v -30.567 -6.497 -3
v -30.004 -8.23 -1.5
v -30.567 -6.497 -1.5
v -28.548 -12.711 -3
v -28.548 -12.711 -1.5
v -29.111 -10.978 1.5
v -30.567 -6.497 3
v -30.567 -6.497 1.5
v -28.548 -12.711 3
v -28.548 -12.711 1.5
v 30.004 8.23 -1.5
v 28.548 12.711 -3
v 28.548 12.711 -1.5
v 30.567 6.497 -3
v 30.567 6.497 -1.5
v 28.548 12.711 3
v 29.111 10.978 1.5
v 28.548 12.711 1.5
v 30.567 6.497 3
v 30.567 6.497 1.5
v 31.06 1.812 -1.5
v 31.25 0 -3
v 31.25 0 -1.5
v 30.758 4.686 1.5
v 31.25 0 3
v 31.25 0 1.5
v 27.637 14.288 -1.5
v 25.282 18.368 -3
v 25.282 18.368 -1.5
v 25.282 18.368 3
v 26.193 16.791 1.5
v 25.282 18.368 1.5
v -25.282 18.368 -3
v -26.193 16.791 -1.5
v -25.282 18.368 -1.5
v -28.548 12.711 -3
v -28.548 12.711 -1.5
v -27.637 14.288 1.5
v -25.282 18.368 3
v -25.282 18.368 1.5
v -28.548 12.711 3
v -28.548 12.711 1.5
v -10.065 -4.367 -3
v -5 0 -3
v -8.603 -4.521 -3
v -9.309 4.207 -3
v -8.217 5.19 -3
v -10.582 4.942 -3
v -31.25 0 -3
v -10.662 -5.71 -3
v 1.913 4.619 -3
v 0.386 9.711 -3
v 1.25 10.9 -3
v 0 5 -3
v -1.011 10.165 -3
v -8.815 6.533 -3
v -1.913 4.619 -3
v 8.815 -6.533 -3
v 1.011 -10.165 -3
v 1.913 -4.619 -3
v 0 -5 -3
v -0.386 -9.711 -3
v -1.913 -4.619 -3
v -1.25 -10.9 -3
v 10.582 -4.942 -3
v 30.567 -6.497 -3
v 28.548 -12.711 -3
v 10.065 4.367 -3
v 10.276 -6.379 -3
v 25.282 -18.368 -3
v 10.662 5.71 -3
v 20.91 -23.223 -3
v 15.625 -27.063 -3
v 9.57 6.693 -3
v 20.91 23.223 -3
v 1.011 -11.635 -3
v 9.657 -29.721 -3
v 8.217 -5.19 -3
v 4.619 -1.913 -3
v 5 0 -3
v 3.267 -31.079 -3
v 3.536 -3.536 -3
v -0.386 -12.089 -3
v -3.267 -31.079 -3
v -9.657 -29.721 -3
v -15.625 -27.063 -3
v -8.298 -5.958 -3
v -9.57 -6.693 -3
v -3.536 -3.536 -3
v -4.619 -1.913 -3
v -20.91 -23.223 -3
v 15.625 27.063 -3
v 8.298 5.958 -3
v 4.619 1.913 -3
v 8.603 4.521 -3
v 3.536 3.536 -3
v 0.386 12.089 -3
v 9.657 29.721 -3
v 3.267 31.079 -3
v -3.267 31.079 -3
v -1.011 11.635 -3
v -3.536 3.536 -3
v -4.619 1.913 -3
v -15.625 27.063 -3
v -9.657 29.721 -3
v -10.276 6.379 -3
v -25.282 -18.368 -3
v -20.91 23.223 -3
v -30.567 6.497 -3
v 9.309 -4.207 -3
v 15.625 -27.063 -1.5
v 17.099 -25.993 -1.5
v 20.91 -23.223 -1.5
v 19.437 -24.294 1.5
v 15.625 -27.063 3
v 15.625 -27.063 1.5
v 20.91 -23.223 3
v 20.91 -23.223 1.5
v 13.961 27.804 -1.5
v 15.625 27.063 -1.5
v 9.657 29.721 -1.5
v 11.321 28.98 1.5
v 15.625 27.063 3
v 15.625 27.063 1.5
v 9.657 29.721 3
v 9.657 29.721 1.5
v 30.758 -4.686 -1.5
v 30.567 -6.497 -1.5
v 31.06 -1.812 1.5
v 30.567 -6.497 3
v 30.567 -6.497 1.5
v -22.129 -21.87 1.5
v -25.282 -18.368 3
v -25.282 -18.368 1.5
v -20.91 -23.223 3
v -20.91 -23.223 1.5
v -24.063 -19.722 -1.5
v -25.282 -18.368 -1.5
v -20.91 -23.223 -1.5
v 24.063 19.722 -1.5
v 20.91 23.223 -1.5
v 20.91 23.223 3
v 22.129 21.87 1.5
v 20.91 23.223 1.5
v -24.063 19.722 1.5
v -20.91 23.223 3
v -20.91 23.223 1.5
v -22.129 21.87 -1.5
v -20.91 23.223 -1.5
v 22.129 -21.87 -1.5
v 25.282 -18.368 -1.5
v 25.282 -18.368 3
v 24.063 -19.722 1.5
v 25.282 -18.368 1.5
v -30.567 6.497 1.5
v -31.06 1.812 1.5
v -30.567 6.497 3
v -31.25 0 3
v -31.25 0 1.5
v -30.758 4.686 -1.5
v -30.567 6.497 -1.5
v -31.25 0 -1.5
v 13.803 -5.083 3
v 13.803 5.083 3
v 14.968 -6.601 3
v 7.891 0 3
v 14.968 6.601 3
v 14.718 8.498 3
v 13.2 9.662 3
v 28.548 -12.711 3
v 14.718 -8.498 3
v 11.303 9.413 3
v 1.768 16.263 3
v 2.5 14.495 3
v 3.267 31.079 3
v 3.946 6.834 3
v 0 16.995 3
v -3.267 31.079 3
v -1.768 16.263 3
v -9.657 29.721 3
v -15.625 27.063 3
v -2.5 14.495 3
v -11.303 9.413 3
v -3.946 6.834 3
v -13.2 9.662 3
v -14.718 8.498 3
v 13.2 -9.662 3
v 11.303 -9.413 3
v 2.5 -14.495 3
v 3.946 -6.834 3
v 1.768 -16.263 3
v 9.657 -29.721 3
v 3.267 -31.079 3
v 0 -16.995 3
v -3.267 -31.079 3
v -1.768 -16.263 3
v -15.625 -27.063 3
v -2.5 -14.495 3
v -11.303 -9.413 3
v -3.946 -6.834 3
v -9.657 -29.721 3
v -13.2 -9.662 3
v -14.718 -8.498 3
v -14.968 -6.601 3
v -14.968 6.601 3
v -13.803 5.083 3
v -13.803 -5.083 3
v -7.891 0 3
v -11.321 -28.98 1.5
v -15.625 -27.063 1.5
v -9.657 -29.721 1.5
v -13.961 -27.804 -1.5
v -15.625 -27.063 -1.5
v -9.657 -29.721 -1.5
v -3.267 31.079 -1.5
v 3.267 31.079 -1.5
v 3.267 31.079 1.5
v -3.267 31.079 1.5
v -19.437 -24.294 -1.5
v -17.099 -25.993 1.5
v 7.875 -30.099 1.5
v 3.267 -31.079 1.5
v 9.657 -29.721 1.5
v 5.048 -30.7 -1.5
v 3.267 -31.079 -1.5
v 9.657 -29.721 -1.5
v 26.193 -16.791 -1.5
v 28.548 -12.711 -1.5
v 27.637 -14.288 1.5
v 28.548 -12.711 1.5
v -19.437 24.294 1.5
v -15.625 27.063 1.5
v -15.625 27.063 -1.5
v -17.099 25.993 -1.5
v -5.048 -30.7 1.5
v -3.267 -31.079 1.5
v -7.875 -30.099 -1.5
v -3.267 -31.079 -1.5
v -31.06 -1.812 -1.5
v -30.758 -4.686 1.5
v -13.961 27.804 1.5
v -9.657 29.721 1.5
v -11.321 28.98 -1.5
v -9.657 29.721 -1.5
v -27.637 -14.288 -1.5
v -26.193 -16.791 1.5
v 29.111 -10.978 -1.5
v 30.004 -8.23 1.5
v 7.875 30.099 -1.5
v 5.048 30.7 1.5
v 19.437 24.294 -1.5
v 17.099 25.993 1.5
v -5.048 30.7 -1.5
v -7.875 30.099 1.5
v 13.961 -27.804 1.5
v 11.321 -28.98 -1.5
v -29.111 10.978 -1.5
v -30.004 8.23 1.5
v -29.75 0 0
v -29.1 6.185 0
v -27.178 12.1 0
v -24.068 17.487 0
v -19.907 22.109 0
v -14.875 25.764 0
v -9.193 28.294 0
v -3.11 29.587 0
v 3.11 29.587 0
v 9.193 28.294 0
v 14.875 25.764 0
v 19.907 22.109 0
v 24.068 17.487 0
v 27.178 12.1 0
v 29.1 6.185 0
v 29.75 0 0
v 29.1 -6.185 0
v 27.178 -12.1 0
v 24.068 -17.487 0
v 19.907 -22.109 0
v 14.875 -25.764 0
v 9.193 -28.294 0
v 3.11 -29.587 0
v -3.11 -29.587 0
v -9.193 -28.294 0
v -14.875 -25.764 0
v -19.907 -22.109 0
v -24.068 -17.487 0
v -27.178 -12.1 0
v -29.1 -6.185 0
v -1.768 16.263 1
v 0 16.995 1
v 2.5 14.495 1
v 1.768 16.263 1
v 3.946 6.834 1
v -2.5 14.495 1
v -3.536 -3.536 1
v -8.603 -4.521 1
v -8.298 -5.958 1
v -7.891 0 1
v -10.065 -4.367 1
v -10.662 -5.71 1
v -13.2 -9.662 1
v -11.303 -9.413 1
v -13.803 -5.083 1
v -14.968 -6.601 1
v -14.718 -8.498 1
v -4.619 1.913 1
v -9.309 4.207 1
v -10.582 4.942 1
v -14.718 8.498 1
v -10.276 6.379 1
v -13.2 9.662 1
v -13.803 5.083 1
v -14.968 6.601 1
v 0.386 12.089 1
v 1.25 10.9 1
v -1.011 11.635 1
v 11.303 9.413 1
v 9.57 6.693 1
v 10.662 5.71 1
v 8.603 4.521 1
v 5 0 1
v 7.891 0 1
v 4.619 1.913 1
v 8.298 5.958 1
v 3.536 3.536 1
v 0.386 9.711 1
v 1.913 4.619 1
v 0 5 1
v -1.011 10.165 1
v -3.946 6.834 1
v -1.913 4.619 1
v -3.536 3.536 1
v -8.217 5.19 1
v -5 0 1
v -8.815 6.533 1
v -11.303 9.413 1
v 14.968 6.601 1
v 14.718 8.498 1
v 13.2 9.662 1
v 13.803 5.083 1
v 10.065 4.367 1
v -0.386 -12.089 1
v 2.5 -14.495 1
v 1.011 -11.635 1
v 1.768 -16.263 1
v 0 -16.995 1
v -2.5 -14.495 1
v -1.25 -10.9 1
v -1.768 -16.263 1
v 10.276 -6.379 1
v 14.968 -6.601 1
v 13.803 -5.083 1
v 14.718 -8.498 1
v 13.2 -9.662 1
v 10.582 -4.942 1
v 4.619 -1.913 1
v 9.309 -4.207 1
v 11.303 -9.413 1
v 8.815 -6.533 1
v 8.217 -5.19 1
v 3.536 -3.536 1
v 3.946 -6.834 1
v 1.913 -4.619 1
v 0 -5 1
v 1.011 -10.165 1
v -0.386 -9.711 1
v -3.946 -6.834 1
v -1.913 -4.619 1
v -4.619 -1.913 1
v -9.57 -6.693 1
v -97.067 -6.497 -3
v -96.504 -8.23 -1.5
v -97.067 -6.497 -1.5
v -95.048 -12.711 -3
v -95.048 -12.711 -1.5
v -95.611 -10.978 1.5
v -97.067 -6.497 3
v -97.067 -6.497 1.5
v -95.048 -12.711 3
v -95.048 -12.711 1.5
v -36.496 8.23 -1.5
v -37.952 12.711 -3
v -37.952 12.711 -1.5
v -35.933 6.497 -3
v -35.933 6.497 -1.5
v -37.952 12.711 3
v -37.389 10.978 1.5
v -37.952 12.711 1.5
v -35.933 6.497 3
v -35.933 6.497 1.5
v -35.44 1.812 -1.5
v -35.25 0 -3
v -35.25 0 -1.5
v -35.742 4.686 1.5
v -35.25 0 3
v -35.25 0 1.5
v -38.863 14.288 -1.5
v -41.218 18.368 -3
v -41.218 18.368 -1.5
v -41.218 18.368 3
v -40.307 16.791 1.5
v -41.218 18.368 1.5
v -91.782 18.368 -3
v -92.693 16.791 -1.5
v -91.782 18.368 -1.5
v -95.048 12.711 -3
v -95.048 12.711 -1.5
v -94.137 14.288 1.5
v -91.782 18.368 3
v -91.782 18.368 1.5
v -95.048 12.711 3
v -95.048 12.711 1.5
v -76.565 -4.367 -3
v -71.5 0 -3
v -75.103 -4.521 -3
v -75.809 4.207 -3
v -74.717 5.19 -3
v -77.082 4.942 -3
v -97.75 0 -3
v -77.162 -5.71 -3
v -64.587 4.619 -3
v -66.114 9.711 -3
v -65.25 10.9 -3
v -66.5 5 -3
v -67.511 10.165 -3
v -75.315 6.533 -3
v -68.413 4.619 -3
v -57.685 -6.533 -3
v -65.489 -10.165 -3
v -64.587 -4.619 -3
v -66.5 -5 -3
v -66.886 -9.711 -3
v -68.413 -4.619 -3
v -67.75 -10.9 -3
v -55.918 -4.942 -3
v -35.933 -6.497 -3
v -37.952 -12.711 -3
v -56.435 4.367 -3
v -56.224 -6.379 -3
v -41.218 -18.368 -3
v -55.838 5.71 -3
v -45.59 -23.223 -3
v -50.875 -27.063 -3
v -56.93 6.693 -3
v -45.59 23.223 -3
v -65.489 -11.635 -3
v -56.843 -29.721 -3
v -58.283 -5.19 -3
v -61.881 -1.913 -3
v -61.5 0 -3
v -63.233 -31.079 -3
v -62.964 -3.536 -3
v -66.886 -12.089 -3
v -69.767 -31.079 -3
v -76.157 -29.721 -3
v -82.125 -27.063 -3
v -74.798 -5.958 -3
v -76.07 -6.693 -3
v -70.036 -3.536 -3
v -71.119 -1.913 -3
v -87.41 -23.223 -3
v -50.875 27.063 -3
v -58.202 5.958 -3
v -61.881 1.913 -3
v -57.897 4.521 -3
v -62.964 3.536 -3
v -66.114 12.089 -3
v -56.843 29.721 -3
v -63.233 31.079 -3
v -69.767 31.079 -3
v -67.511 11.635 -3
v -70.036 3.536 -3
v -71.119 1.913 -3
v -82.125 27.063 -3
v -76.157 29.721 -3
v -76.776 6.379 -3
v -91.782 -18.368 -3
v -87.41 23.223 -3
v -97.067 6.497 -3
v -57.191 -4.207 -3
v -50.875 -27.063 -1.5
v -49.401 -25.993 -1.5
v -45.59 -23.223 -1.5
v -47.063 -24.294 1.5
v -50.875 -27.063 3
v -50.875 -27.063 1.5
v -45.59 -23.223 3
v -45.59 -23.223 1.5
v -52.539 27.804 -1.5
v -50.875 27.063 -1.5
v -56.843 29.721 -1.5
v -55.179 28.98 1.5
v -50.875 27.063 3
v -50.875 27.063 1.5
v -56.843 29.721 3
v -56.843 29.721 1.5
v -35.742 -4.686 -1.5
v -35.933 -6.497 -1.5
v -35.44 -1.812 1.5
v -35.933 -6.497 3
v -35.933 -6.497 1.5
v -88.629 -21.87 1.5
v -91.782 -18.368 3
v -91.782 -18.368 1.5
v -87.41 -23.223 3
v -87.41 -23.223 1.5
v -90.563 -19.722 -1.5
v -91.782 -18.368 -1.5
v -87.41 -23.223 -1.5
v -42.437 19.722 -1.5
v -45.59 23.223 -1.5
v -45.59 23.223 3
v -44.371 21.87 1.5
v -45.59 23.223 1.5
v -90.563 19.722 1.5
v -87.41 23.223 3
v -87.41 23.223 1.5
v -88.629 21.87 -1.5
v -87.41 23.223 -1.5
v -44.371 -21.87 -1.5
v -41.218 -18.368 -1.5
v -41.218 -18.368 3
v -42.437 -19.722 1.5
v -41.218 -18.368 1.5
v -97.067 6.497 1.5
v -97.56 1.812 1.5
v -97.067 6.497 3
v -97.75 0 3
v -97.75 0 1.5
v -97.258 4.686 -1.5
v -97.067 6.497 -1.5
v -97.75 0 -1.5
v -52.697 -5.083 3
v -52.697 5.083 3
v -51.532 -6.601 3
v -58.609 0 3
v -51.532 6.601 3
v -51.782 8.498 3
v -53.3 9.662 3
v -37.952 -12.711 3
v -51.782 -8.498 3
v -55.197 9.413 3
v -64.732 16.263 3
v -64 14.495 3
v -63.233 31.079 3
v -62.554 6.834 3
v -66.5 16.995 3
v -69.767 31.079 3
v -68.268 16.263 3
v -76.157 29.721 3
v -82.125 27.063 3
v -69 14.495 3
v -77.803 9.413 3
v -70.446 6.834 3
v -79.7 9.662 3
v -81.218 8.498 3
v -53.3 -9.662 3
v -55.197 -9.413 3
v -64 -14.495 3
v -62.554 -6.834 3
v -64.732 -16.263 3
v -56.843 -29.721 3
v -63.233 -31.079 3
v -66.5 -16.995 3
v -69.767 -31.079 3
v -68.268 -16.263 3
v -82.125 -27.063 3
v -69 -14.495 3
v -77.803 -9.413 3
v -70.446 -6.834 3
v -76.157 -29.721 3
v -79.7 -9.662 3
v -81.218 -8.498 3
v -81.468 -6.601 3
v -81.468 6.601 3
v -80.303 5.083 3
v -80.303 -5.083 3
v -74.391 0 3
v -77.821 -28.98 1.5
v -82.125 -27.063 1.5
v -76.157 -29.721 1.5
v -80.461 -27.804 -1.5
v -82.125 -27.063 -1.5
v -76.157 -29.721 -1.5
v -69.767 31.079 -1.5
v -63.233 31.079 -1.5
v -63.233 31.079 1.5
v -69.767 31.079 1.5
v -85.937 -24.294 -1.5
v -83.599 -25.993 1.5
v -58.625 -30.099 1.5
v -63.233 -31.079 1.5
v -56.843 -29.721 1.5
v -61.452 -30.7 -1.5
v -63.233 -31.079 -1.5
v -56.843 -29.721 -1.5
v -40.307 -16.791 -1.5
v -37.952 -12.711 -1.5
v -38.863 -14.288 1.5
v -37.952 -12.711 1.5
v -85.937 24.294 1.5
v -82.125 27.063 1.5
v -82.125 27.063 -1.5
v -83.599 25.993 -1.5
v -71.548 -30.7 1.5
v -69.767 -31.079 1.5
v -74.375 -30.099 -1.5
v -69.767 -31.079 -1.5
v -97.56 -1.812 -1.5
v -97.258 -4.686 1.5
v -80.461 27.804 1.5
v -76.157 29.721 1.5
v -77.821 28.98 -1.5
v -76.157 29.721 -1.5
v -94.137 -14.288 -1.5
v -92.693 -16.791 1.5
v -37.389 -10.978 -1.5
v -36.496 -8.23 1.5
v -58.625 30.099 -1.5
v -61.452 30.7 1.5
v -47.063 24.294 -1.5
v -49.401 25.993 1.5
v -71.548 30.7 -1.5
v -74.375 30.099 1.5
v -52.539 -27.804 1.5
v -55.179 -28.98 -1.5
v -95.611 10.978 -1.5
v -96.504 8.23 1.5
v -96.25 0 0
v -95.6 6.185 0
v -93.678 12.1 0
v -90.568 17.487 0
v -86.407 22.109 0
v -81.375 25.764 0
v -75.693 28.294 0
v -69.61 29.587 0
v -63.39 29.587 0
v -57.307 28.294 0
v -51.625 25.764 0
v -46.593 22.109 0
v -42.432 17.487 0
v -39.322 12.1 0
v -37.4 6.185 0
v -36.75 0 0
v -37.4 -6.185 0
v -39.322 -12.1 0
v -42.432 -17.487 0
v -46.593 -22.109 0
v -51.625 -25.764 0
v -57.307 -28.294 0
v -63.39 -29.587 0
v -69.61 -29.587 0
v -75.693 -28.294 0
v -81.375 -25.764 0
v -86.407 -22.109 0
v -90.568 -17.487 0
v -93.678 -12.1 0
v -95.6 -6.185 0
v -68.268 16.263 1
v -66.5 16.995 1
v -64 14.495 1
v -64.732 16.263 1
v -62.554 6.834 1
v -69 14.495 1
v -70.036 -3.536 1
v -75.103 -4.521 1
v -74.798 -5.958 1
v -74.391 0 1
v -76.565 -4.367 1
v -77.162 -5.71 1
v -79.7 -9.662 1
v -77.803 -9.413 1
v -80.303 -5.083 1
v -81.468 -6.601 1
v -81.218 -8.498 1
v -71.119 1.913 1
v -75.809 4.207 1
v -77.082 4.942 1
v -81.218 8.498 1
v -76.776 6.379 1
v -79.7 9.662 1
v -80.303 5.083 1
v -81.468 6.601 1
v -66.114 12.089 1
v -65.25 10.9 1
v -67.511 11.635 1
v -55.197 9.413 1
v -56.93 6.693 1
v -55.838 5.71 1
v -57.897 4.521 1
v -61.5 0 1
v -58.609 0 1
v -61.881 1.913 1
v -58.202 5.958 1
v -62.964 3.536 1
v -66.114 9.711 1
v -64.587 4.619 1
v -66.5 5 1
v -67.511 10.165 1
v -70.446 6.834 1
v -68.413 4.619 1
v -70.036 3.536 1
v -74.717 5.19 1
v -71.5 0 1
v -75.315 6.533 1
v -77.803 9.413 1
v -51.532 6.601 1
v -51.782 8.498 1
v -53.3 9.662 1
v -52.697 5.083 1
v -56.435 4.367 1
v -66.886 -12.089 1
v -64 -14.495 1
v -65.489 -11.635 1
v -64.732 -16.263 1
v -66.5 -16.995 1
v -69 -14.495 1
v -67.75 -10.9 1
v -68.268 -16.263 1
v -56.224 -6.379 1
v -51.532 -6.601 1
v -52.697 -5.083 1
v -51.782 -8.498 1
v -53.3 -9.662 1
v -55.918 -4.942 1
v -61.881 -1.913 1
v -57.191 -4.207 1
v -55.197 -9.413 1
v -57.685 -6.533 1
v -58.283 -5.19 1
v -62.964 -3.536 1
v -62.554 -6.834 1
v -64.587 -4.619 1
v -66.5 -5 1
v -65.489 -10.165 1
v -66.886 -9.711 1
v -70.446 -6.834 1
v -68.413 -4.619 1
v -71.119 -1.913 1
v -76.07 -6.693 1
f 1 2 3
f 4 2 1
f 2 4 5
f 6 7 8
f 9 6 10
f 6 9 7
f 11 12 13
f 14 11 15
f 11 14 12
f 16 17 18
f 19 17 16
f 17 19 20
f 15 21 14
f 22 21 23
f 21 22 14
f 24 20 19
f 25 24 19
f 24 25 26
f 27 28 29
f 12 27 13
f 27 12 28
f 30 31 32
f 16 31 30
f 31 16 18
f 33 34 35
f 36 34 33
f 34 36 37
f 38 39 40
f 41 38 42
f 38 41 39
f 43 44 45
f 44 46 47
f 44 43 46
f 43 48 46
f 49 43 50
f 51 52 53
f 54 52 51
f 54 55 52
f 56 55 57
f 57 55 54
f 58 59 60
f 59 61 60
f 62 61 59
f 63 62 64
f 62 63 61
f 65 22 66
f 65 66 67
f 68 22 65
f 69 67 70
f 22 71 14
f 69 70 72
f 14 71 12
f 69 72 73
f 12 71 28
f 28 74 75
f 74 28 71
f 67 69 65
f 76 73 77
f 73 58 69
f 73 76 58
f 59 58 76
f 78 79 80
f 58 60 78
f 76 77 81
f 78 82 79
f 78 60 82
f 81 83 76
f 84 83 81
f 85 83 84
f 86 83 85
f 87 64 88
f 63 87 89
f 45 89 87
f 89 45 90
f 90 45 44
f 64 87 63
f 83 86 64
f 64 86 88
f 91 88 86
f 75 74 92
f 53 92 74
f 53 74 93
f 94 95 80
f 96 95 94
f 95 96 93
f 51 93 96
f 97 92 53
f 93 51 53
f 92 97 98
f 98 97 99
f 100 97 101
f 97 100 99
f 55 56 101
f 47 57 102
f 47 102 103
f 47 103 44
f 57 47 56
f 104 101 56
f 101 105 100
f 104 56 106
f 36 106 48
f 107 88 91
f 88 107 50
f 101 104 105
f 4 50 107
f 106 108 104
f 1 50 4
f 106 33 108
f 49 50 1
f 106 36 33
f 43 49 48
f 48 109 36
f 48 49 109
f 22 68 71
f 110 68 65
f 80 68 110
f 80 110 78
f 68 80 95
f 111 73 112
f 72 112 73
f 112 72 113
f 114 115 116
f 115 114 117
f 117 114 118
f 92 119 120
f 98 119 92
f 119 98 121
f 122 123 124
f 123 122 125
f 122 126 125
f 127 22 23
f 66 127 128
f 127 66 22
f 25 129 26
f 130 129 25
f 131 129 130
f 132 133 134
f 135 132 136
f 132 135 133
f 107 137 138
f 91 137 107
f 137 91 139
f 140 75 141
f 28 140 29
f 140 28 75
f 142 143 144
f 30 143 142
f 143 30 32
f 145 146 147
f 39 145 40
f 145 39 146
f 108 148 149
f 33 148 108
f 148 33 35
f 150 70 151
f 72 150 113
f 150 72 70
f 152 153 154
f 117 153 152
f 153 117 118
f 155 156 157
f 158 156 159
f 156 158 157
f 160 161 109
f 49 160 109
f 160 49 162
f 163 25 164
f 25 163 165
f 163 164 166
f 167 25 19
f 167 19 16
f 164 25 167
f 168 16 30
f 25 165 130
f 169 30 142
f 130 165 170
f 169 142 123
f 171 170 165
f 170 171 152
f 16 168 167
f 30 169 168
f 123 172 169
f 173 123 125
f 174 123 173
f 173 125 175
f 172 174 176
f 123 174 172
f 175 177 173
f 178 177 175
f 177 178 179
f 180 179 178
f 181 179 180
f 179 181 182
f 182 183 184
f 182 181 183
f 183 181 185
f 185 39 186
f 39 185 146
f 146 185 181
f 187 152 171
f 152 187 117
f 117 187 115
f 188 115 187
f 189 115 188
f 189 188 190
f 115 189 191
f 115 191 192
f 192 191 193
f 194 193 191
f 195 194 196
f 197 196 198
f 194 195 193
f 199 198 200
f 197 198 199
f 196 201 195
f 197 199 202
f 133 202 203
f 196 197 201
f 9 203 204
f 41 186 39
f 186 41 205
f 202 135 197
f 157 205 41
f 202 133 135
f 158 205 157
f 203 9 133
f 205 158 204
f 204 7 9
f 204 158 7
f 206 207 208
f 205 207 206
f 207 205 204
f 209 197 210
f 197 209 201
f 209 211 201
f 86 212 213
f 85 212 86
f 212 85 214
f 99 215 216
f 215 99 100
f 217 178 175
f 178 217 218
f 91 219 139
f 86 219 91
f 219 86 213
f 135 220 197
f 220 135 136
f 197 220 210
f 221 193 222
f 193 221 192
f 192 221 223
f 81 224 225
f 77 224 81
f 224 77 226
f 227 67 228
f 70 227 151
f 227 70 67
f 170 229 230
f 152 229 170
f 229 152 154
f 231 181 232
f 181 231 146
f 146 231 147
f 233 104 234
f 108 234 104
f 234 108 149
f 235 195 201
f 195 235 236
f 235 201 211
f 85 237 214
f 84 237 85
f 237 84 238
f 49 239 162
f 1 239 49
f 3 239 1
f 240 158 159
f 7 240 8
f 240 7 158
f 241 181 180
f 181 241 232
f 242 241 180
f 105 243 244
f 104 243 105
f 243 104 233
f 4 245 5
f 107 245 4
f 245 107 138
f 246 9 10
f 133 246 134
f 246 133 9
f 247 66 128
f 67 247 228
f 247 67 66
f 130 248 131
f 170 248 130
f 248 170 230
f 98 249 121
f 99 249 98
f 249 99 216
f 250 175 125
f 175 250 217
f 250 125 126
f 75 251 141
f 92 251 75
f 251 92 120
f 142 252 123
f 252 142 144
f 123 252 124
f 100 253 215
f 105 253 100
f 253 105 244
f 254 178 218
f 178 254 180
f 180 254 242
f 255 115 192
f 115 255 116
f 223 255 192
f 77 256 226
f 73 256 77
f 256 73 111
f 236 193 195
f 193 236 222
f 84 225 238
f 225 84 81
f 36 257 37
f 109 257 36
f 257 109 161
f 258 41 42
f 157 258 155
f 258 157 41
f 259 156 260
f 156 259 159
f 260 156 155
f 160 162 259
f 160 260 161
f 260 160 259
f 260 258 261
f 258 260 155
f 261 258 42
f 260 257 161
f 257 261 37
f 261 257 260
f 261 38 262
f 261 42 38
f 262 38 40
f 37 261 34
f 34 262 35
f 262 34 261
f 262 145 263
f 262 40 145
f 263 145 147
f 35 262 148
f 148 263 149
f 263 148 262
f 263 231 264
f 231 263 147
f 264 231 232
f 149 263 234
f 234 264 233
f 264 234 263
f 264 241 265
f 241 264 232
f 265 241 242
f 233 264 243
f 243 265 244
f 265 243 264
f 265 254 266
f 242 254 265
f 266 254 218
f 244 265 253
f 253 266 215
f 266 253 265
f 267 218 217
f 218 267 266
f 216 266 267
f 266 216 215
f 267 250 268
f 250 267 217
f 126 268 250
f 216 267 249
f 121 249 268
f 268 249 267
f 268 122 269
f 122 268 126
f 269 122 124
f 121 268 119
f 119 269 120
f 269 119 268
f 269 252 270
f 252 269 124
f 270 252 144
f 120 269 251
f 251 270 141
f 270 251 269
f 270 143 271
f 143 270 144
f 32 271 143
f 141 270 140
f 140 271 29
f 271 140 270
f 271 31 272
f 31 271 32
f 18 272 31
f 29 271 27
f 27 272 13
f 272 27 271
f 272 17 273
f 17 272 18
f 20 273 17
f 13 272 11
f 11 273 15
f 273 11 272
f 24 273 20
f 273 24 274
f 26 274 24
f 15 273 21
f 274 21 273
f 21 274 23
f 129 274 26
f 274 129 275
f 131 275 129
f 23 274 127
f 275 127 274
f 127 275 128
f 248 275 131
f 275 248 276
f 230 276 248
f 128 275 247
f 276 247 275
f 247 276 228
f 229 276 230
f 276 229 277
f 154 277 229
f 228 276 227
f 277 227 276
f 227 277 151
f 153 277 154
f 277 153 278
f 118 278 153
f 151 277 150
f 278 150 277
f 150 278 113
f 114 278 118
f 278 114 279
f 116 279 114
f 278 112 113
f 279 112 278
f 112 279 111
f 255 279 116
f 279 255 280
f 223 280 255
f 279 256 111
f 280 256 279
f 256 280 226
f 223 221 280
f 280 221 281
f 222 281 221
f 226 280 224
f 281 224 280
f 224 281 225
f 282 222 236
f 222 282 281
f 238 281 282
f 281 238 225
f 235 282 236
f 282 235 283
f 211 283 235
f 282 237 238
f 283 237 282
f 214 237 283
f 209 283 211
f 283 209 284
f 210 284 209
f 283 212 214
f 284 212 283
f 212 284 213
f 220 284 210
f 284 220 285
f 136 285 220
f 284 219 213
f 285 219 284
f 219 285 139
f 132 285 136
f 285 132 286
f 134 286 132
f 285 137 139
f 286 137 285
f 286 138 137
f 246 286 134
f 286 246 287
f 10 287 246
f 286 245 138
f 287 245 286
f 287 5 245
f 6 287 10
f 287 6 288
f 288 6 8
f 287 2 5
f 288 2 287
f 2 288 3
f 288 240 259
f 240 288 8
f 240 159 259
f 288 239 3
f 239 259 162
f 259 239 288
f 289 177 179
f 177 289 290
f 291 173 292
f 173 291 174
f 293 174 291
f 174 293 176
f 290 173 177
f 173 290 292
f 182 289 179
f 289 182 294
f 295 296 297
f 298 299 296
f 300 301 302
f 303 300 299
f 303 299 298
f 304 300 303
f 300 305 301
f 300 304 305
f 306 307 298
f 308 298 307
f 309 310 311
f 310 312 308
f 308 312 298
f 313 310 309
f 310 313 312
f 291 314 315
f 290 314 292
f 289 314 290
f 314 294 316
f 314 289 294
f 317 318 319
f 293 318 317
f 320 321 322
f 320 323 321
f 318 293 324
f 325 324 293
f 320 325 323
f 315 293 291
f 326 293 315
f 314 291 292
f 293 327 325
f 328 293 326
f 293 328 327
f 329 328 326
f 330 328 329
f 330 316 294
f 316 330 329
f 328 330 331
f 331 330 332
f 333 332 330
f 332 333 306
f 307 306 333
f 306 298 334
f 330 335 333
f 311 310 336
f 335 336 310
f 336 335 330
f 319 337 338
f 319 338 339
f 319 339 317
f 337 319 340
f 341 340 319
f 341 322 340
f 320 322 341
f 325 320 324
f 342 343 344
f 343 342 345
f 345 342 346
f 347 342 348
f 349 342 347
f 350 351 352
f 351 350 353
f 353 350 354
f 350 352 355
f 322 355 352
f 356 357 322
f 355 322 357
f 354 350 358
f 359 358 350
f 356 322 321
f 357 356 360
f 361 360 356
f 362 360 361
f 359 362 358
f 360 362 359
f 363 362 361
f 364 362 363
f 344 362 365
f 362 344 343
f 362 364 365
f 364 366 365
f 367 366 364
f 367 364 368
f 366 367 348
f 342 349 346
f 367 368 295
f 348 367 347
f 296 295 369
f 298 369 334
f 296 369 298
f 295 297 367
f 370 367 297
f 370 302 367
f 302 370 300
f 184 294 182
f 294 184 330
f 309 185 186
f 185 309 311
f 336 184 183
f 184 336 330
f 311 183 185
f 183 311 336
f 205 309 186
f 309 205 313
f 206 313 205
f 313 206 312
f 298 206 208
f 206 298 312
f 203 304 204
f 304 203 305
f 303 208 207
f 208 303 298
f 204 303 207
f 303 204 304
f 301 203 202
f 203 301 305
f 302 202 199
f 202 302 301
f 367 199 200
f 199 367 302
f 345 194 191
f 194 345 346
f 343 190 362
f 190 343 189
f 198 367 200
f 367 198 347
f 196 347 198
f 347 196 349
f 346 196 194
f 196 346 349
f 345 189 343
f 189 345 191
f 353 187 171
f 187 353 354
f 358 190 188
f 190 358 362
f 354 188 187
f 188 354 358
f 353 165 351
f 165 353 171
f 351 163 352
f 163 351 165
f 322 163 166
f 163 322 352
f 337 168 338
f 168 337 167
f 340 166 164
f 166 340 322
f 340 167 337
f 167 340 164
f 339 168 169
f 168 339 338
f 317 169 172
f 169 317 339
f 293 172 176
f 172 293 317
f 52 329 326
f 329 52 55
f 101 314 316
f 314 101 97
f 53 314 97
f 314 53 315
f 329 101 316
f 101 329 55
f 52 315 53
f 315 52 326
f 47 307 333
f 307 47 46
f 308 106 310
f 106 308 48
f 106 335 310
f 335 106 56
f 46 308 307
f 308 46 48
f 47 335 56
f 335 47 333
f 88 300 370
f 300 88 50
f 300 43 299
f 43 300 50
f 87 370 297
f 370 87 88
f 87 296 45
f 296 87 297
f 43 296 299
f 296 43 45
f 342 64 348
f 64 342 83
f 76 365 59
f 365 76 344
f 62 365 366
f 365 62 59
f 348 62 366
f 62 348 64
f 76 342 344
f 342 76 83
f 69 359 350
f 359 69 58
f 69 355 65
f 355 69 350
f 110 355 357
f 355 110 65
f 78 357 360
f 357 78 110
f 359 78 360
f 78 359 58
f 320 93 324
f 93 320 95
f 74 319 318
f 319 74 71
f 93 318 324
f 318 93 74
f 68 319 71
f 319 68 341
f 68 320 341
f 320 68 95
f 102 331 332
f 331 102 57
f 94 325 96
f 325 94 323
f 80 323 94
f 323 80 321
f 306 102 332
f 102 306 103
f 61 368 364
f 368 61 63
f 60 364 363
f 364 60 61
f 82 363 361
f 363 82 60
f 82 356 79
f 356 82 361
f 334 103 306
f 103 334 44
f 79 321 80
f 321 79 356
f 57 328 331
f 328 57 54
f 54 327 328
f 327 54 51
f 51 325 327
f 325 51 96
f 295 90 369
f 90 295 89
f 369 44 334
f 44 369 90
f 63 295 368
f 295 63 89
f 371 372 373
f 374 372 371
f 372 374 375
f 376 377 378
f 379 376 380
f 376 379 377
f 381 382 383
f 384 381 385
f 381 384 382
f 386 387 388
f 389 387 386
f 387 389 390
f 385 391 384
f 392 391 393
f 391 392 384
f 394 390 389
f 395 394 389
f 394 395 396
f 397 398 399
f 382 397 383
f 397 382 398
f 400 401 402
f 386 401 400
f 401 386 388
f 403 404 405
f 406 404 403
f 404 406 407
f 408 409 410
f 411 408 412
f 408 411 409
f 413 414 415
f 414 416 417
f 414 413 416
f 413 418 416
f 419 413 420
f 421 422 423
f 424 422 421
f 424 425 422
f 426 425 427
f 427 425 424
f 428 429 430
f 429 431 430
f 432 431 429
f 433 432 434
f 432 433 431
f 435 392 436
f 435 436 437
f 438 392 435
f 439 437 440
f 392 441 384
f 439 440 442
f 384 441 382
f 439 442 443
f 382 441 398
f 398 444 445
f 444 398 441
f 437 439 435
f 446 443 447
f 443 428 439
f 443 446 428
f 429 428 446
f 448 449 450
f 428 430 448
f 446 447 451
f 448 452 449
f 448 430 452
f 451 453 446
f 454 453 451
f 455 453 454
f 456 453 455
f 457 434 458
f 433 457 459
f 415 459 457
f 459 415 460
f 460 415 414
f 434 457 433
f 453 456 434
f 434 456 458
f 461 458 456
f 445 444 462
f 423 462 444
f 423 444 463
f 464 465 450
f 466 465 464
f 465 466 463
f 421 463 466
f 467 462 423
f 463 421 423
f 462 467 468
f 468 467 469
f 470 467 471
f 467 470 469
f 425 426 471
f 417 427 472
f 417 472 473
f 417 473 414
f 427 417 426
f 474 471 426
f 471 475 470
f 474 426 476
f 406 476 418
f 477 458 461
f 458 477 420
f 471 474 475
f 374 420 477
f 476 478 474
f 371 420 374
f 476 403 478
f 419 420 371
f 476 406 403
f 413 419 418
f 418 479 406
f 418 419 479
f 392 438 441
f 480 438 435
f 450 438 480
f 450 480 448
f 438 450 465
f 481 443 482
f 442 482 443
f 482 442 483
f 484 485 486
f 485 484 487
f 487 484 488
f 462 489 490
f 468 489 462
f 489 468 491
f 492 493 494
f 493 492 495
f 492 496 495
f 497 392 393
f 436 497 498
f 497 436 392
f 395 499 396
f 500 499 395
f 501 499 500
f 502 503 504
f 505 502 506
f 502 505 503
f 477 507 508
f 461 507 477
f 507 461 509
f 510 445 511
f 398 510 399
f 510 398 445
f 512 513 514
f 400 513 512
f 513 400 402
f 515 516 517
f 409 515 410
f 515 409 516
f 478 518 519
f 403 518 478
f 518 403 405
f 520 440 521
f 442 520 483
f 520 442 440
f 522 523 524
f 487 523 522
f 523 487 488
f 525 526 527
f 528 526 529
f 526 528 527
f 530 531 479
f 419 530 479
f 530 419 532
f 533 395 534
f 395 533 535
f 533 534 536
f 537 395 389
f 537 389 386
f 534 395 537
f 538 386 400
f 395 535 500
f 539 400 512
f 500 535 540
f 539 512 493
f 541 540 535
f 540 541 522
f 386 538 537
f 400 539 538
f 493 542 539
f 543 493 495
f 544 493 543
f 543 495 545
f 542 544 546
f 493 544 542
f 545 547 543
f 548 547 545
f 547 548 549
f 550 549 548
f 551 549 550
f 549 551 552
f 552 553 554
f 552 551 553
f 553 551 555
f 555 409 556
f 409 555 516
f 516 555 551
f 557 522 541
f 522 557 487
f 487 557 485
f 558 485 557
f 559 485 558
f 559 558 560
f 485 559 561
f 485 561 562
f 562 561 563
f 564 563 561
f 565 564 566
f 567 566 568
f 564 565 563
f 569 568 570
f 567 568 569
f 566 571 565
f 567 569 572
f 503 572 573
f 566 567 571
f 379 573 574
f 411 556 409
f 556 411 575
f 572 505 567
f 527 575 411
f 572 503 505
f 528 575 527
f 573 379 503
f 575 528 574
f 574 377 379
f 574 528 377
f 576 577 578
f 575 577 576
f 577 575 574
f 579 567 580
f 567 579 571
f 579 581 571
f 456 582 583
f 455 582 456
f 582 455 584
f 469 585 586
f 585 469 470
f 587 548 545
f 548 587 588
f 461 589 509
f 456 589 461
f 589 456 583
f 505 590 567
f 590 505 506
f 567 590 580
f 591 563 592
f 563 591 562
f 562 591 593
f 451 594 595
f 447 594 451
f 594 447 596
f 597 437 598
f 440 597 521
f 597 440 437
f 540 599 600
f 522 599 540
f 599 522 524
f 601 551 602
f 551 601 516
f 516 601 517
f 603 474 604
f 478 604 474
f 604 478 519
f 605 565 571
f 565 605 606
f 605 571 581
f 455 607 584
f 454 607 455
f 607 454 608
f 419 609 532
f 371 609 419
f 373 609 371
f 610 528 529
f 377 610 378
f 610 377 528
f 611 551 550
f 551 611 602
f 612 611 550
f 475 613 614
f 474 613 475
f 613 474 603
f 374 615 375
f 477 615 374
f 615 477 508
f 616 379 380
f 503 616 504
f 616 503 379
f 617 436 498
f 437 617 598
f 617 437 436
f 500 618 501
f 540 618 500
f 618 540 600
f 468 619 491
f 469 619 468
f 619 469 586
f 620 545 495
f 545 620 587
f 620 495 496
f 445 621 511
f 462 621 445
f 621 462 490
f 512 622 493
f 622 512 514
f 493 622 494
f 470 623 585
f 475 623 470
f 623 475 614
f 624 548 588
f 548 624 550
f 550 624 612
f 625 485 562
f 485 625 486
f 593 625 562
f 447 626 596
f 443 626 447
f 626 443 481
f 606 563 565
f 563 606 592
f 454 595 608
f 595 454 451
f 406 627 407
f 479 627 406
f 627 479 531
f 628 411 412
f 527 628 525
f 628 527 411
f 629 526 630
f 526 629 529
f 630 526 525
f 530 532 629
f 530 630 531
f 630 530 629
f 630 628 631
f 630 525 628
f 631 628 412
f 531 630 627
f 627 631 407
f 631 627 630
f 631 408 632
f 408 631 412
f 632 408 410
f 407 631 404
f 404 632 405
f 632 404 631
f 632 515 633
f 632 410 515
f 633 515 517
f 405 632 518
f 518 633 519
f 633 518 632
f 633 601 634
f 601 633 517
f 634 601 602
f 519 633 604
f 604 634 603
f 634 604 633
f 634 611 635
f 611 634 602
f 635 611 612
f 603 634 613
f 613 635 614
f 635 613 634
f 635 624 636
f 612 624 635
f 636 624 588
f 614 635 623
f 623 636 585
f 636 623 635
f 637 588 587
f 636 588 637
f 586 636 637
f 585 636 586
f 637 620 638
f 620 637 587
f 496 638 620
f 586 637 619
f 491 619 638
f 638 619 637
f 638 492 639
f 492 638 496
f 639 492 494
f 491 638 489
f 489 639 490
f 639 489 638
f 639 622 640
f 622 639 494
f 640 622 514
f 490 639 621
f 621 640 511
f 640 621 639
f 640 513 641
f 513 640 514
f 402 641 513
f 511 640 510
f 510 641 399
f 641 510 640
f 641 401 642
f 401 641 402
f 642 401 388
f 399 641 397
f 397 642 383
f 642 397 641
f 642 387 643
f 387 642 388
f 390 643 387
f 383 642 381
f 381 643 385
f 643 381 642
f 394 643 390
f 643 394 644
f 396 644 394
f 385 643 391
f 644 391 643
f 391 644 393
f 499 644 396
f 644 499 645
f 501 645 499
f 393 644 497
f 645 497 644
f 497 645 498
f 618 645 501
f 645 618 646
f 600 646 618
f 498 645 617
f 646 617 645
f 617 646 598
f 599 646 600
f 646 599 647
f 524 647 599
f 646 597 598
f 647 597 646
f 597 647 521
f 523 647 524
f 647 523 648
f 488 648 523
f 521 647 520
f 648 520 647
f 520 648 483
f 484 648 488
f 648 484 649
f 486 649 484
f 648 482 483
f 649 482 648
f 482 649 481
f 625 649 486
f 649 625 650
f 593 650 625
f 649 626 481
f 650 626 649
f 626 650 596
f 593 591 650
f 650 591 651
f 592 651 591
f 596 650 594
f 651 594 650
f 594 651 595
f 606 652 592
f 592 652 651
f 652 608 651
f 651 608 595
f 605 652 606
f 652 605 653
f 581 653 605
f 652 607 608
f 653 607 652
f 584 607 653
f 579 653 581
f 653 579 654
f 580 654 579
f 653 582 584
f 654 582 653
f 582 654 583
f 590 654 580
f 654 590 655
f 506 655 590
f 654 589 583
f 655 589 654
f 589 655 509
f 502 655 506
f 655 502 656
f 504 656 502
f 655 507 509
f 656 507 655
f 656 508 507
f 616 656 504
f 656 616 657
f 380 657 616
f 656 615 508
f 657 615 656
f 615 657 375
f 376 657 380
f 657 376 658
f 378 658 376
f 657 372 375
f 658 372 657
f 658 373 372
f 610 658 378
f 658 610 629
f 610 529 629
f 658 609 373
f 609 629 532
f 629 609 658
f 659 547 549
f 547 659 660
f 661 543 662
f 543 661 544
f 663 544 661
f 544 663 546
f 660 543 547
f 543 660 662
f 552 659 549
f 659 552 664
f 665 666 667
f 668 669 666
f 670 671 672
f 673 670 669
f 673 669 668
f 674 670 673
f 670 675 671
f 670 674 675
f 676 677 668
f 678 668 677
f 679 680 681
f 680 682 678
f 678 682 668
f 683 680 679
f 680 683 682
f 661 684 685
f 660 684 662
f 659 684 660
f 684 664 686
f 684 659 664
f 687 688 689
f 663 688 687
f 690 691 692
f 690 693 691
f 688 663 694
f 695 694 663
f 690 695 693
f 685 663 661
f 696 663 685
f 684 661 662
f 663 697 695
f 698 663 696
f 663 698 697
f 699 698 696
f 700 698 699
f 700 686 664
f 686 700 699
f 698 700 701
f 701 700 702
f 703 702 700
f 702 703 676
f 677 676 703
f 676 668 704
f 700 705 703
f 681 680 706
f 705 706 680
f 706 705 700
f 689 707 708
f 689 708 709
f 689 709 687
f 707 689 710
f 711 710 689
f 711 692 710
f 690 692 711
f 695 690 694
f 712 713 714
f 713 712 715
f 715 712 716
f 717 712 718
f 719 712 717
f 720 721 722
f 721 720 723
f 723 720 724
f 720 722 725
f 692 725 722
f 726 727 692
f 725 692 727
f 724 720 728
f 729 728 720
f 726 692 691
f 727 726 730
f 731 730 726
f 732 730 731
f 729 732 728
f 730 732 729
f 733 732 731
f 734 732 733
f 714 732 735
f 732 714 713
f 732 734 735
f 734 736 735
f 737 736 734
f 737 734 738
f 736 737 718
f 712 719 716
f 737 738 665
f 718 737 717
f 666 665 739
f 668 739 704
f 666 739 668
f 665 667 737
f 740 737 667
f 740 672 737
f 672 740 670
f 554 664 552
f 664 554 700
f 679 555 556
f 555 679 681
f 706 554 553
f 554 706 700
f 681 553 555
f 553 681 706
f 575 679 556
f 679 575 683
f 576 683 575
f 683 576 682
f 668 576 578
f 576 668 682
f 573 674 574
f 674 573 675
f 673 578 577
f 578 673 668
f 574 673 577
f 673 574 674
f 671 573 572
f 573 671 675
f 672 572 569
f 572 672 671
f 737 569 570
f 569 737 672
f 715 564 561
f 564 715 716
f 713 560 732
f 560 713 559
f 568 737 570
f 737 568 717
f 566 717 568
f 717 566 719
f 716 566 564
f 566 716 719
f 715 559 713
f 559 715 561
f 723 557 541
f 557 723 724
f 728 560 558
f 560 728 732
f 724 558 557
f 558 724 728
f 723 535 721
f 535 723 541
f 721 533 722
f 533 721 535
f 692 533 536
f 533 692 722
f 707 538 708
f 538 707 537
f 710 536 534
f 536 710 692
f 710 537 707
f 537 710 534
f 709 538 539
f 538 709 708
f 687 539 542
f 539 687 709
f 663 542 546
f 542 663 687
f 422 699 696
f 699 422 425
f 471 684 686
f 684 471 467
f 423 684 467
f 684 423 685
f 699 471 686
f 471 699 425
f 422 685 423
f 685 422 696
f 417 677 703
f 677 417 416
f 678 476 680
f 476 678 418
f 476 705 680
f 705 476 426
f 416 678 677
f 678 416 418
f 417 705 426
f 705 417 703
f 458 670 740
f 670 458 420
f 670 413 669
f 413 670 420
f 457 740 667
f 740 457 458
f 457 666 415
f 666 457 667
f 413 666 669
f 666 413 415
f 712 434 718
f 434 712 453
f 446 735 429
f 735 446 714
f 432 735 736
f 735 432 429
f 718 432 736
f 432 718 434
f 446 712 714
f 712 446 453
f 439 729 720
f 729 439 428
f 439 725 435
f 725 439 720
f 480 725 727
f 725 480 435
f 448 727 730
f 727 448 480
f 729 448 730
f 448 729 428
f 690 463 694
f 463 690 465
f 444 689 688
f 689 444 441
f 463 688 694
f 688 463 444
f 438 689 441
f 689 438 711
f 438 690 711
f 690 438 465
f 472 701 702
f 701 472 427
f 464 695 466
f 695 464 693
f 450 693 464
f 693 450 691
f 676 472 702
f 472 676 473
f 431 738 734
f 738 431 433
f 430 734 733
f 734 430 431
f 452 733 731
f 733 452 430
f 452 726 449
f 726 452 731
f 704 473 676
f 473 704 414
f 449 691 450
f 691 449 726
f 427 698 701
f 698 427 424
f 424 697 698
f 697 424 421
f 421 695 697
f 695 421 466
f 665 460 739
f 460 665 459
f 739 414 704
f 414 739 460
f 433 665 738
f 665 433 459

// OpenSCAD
//-------------------------------------------------------------
//-- Servo wheel
//-- (c) Juan Gonzalez (obijuan) juan@iearobotics.com
//-- March-2012
//-------------------------------------------------------------
//-- Wheel for mobile robots, drived by Futaba 3003 servos
//-------------------------------------------------------------

//-- Wheel parameters
wheel_or_idiam = 50+2*(3.25);                   //-- O-ring inner diameter
wheel_or_diam = 3;                     //-- O-ring section diameter
wheel_height = 2*wheel_or_diam+0;     //-- Wheel height: change the 0 for 
                                      //-- other value (0 equals minimun height)
//-- Parameters common to all horns
horn_drill_diam = 2.5;
horn_height = 6;        //-- Total height: shaft + plate
horn_plate_height = 2;  //-- plate height

//-- Futaba 3003 servo rounded horn parameters
rh_diam1 = 8.5;  //-- Rounded horn small diameter
rh_diam2 = 21.5; //-- Rounded horn big diameter
rounded_horn_drill_distance = 7.3;

//-- Futaba 3003 horn drills


//-- Futaba 3003 4-arm horn parameters
a4h_end_diam = 5;
a4h_center_diam = 10;
a4h_arm_length = 15+0.5;
a4h_drill_distance = 13.3;


//-- Futaba 3003 6-arm horn parameters
a6h_end_diam = 5;
a6h_center_diam = 10;
a6h_arm_length=10+0.5;
a6h_arm_base_diam=7.5+0.5;
a6h_drill_distance = 10.9;


//-------------------------------------------------------
//--- Parameters:
//-- or_idiam: O-ring inner diameter
//-- or_diam: O-ring section diameter
//-- h: Height of the wheel
//--
//--  Module for generating a raw wheel, with no drills
//--  and no servo horn
//-------------------------------------------------------
module raw_wheel(or_idiam=50, or_diam=3, h=6)
{
   //-- Wheel parameters
   r = or_idiam/2 + or_diam;   //-- Radius

  //-- Temporal points
  l = or_diam*sqrt(2)/2;

  difference() {
    //-- Body of the wheel
    cylinder (r=r, h=h,center=true);

    //--  wheel's inner section
    rotate_extrude()
      translate([r-or_diam/2,0,0])
      polygon( [ [0,0],[l,l],[l,-l] ] , [ [0,1,2] ]);
  }
}

//--------------------------------------------------------------
//-- Generic module for the horn's drills
//-- Parameters:
//--  d = drill's radial distance (from the horn's center)
//--  n = number of drills
//--  h = wheel height
//--------------------------------------------------------------
module horn_drills(d,n,h)
{
  union() {
    for ( i = [0 : n-1] ) {
        rotate([0,0,i*360/n])
        translate([0,d,0])
        cylinder(r=horn_drill_diam/2, h=h+10,center=true);  
      }
  }
}

//-----------------------------------------
//-- Futaba 3003 horn4 arm
//-- This module is just one arm
//-----------------------------------------
module horn4_arm(h=5)
{
  translate([0,a4h_arm_length-a4h_end_diam/2,0])
  //-- The arm consist of the perimeter of a cylinder and a cube
  hull() {
    cylinder(r=a4h_end_diam/2, h=h, center=true);
    translate([0,1-a4h_arm_length+a4h_end_diam/2,0])
      cube([a4h_center_diam,2,h],center=true);
  }
}

//-----------------------------------------
//-- Futaba 3003 horn6 arm
//-- This module is just one arm
//-----------------------------------------
module horn6_arm(h=5)
{
  translate([0,a6h_arm_length-a6h_end_diam/2,0])
  //-- The arm consist of the perimeter of a cylinder and a cube
  hull() {
    cylinder(r=a6h_end_diam/2, h=h, center=true);
    translate([0,-a6h_arm_length+a6h_end_diam/2,0])
    cube([a6h_arm_base_diam,0.1,h],center=true);
  }
}


//-------------------------------------------
//-- Futaba 3003 4-arm horn
//-------------------------------------------
module horn4(h=5)
{
  union() {
    //-- Center part (is a square)
    cube([a4h_center_diam+0.2,a4h_center_diam+0.2,h],center=true);

    //-- Place the 4 arms in every side of the cube
    for ( i = [0 : 3] ) {
      rotate( [0,0,i*90])
      translate([0, a4h_center_diam/2, 0])
      horn4_arm(h);
    }
  }

}

//-------------------------------------------
//-- Futaba 3003 6-arm horn
//-------------------------------------------
module horn6(h=5)
{
  union() {
    //-- The center part is a cylinder
    cylinder(r=15/2,h=h,center=true);

    //-- Place the 6 arms rotated 60 degrees
    for ( i = [0 : 5] ) {
      rotate( [0,0,i*60])
      translate([0, 15/2*cos(30), 0])
      horn6_arm(h);
    }
  }
}


//-------------------------------------------------------
//--  A Wheel for the futaba 3003 rounded horns
//--------------------------------------------------------
module Servo_wheel_rounded_horn()
{
  difference() {
      raw_wheel(or_idiam=wheel_or_idiam, or_diam=wheel_or_diam, h=wheel_height);

      //-- Inner drill
      cylinder(center=true, h=2*wheel_height + 10, r=rh_diam1/2+0.2);

      //-- Carved circle for the Futaba rounded horn
      translate([0,0,-wheel_height/2+horn_height-horn_plate_height]) 
       cylinder(r=rh_diam2/2+0.25, h=2*wheel_height+10);

      //-- small drills for the rounded horn
      horn_drills(d=rounded_horn_drill_distance, n=4, h=wheel_height);
  }

}

//-------------------------------------------------------
//--  A Wheel for the futaba 3003 4-arm horns
//--------------------------------------------------------
module Servo_wheel_4_arm_horn()
{
  difference() {
      raw_wheel(or_idiam=wheel_or_idiam, or_diam=wheel_or_diam, h=wheel_height);

      //-- Inner drill
      cylinder(center=true, h=2*wheel_height + 10, r=a4h_center_diam/2);

      //-- substract the 4-arm servo horn
      translate([0,0,horn_height-horn_plate_height])
        horn4(h=wheel_height);

      //-- Horn drills
      horn_drills(d=a4h_drill_distance, n=4, h=wheel_height);

  }
}

//-------------------------------------------------------
//--  A Wheel for the futaba 3003 6-arm horns
//--------------------------------------------------------
module Servo_wheel_6_arm_horn()
{
  difference() {
      raw_wheel(or_idiam=wheel_or_idiam, or_diam=wheel_or_diam, h=wheel_height);

       //-- Inner drill
      cylinder(center=true, h=2*wheel_height + 10, r=a6h_center_diam/2);

      //-- substract the 6-arm horn
      translate([0,0,horn_height-horn_plate_height])
      horn6(h=wheel_height);

      //-- Horn drills
      horn_drills(d=a6h_drill_distance, n=6, h=wheel_height);
  }
}


//-- Test!
Servo_wheel_6_arm_horn();
translate([-wheel_or_idiam-10,0,0]) Servo_wheel_6_arm_horn();
